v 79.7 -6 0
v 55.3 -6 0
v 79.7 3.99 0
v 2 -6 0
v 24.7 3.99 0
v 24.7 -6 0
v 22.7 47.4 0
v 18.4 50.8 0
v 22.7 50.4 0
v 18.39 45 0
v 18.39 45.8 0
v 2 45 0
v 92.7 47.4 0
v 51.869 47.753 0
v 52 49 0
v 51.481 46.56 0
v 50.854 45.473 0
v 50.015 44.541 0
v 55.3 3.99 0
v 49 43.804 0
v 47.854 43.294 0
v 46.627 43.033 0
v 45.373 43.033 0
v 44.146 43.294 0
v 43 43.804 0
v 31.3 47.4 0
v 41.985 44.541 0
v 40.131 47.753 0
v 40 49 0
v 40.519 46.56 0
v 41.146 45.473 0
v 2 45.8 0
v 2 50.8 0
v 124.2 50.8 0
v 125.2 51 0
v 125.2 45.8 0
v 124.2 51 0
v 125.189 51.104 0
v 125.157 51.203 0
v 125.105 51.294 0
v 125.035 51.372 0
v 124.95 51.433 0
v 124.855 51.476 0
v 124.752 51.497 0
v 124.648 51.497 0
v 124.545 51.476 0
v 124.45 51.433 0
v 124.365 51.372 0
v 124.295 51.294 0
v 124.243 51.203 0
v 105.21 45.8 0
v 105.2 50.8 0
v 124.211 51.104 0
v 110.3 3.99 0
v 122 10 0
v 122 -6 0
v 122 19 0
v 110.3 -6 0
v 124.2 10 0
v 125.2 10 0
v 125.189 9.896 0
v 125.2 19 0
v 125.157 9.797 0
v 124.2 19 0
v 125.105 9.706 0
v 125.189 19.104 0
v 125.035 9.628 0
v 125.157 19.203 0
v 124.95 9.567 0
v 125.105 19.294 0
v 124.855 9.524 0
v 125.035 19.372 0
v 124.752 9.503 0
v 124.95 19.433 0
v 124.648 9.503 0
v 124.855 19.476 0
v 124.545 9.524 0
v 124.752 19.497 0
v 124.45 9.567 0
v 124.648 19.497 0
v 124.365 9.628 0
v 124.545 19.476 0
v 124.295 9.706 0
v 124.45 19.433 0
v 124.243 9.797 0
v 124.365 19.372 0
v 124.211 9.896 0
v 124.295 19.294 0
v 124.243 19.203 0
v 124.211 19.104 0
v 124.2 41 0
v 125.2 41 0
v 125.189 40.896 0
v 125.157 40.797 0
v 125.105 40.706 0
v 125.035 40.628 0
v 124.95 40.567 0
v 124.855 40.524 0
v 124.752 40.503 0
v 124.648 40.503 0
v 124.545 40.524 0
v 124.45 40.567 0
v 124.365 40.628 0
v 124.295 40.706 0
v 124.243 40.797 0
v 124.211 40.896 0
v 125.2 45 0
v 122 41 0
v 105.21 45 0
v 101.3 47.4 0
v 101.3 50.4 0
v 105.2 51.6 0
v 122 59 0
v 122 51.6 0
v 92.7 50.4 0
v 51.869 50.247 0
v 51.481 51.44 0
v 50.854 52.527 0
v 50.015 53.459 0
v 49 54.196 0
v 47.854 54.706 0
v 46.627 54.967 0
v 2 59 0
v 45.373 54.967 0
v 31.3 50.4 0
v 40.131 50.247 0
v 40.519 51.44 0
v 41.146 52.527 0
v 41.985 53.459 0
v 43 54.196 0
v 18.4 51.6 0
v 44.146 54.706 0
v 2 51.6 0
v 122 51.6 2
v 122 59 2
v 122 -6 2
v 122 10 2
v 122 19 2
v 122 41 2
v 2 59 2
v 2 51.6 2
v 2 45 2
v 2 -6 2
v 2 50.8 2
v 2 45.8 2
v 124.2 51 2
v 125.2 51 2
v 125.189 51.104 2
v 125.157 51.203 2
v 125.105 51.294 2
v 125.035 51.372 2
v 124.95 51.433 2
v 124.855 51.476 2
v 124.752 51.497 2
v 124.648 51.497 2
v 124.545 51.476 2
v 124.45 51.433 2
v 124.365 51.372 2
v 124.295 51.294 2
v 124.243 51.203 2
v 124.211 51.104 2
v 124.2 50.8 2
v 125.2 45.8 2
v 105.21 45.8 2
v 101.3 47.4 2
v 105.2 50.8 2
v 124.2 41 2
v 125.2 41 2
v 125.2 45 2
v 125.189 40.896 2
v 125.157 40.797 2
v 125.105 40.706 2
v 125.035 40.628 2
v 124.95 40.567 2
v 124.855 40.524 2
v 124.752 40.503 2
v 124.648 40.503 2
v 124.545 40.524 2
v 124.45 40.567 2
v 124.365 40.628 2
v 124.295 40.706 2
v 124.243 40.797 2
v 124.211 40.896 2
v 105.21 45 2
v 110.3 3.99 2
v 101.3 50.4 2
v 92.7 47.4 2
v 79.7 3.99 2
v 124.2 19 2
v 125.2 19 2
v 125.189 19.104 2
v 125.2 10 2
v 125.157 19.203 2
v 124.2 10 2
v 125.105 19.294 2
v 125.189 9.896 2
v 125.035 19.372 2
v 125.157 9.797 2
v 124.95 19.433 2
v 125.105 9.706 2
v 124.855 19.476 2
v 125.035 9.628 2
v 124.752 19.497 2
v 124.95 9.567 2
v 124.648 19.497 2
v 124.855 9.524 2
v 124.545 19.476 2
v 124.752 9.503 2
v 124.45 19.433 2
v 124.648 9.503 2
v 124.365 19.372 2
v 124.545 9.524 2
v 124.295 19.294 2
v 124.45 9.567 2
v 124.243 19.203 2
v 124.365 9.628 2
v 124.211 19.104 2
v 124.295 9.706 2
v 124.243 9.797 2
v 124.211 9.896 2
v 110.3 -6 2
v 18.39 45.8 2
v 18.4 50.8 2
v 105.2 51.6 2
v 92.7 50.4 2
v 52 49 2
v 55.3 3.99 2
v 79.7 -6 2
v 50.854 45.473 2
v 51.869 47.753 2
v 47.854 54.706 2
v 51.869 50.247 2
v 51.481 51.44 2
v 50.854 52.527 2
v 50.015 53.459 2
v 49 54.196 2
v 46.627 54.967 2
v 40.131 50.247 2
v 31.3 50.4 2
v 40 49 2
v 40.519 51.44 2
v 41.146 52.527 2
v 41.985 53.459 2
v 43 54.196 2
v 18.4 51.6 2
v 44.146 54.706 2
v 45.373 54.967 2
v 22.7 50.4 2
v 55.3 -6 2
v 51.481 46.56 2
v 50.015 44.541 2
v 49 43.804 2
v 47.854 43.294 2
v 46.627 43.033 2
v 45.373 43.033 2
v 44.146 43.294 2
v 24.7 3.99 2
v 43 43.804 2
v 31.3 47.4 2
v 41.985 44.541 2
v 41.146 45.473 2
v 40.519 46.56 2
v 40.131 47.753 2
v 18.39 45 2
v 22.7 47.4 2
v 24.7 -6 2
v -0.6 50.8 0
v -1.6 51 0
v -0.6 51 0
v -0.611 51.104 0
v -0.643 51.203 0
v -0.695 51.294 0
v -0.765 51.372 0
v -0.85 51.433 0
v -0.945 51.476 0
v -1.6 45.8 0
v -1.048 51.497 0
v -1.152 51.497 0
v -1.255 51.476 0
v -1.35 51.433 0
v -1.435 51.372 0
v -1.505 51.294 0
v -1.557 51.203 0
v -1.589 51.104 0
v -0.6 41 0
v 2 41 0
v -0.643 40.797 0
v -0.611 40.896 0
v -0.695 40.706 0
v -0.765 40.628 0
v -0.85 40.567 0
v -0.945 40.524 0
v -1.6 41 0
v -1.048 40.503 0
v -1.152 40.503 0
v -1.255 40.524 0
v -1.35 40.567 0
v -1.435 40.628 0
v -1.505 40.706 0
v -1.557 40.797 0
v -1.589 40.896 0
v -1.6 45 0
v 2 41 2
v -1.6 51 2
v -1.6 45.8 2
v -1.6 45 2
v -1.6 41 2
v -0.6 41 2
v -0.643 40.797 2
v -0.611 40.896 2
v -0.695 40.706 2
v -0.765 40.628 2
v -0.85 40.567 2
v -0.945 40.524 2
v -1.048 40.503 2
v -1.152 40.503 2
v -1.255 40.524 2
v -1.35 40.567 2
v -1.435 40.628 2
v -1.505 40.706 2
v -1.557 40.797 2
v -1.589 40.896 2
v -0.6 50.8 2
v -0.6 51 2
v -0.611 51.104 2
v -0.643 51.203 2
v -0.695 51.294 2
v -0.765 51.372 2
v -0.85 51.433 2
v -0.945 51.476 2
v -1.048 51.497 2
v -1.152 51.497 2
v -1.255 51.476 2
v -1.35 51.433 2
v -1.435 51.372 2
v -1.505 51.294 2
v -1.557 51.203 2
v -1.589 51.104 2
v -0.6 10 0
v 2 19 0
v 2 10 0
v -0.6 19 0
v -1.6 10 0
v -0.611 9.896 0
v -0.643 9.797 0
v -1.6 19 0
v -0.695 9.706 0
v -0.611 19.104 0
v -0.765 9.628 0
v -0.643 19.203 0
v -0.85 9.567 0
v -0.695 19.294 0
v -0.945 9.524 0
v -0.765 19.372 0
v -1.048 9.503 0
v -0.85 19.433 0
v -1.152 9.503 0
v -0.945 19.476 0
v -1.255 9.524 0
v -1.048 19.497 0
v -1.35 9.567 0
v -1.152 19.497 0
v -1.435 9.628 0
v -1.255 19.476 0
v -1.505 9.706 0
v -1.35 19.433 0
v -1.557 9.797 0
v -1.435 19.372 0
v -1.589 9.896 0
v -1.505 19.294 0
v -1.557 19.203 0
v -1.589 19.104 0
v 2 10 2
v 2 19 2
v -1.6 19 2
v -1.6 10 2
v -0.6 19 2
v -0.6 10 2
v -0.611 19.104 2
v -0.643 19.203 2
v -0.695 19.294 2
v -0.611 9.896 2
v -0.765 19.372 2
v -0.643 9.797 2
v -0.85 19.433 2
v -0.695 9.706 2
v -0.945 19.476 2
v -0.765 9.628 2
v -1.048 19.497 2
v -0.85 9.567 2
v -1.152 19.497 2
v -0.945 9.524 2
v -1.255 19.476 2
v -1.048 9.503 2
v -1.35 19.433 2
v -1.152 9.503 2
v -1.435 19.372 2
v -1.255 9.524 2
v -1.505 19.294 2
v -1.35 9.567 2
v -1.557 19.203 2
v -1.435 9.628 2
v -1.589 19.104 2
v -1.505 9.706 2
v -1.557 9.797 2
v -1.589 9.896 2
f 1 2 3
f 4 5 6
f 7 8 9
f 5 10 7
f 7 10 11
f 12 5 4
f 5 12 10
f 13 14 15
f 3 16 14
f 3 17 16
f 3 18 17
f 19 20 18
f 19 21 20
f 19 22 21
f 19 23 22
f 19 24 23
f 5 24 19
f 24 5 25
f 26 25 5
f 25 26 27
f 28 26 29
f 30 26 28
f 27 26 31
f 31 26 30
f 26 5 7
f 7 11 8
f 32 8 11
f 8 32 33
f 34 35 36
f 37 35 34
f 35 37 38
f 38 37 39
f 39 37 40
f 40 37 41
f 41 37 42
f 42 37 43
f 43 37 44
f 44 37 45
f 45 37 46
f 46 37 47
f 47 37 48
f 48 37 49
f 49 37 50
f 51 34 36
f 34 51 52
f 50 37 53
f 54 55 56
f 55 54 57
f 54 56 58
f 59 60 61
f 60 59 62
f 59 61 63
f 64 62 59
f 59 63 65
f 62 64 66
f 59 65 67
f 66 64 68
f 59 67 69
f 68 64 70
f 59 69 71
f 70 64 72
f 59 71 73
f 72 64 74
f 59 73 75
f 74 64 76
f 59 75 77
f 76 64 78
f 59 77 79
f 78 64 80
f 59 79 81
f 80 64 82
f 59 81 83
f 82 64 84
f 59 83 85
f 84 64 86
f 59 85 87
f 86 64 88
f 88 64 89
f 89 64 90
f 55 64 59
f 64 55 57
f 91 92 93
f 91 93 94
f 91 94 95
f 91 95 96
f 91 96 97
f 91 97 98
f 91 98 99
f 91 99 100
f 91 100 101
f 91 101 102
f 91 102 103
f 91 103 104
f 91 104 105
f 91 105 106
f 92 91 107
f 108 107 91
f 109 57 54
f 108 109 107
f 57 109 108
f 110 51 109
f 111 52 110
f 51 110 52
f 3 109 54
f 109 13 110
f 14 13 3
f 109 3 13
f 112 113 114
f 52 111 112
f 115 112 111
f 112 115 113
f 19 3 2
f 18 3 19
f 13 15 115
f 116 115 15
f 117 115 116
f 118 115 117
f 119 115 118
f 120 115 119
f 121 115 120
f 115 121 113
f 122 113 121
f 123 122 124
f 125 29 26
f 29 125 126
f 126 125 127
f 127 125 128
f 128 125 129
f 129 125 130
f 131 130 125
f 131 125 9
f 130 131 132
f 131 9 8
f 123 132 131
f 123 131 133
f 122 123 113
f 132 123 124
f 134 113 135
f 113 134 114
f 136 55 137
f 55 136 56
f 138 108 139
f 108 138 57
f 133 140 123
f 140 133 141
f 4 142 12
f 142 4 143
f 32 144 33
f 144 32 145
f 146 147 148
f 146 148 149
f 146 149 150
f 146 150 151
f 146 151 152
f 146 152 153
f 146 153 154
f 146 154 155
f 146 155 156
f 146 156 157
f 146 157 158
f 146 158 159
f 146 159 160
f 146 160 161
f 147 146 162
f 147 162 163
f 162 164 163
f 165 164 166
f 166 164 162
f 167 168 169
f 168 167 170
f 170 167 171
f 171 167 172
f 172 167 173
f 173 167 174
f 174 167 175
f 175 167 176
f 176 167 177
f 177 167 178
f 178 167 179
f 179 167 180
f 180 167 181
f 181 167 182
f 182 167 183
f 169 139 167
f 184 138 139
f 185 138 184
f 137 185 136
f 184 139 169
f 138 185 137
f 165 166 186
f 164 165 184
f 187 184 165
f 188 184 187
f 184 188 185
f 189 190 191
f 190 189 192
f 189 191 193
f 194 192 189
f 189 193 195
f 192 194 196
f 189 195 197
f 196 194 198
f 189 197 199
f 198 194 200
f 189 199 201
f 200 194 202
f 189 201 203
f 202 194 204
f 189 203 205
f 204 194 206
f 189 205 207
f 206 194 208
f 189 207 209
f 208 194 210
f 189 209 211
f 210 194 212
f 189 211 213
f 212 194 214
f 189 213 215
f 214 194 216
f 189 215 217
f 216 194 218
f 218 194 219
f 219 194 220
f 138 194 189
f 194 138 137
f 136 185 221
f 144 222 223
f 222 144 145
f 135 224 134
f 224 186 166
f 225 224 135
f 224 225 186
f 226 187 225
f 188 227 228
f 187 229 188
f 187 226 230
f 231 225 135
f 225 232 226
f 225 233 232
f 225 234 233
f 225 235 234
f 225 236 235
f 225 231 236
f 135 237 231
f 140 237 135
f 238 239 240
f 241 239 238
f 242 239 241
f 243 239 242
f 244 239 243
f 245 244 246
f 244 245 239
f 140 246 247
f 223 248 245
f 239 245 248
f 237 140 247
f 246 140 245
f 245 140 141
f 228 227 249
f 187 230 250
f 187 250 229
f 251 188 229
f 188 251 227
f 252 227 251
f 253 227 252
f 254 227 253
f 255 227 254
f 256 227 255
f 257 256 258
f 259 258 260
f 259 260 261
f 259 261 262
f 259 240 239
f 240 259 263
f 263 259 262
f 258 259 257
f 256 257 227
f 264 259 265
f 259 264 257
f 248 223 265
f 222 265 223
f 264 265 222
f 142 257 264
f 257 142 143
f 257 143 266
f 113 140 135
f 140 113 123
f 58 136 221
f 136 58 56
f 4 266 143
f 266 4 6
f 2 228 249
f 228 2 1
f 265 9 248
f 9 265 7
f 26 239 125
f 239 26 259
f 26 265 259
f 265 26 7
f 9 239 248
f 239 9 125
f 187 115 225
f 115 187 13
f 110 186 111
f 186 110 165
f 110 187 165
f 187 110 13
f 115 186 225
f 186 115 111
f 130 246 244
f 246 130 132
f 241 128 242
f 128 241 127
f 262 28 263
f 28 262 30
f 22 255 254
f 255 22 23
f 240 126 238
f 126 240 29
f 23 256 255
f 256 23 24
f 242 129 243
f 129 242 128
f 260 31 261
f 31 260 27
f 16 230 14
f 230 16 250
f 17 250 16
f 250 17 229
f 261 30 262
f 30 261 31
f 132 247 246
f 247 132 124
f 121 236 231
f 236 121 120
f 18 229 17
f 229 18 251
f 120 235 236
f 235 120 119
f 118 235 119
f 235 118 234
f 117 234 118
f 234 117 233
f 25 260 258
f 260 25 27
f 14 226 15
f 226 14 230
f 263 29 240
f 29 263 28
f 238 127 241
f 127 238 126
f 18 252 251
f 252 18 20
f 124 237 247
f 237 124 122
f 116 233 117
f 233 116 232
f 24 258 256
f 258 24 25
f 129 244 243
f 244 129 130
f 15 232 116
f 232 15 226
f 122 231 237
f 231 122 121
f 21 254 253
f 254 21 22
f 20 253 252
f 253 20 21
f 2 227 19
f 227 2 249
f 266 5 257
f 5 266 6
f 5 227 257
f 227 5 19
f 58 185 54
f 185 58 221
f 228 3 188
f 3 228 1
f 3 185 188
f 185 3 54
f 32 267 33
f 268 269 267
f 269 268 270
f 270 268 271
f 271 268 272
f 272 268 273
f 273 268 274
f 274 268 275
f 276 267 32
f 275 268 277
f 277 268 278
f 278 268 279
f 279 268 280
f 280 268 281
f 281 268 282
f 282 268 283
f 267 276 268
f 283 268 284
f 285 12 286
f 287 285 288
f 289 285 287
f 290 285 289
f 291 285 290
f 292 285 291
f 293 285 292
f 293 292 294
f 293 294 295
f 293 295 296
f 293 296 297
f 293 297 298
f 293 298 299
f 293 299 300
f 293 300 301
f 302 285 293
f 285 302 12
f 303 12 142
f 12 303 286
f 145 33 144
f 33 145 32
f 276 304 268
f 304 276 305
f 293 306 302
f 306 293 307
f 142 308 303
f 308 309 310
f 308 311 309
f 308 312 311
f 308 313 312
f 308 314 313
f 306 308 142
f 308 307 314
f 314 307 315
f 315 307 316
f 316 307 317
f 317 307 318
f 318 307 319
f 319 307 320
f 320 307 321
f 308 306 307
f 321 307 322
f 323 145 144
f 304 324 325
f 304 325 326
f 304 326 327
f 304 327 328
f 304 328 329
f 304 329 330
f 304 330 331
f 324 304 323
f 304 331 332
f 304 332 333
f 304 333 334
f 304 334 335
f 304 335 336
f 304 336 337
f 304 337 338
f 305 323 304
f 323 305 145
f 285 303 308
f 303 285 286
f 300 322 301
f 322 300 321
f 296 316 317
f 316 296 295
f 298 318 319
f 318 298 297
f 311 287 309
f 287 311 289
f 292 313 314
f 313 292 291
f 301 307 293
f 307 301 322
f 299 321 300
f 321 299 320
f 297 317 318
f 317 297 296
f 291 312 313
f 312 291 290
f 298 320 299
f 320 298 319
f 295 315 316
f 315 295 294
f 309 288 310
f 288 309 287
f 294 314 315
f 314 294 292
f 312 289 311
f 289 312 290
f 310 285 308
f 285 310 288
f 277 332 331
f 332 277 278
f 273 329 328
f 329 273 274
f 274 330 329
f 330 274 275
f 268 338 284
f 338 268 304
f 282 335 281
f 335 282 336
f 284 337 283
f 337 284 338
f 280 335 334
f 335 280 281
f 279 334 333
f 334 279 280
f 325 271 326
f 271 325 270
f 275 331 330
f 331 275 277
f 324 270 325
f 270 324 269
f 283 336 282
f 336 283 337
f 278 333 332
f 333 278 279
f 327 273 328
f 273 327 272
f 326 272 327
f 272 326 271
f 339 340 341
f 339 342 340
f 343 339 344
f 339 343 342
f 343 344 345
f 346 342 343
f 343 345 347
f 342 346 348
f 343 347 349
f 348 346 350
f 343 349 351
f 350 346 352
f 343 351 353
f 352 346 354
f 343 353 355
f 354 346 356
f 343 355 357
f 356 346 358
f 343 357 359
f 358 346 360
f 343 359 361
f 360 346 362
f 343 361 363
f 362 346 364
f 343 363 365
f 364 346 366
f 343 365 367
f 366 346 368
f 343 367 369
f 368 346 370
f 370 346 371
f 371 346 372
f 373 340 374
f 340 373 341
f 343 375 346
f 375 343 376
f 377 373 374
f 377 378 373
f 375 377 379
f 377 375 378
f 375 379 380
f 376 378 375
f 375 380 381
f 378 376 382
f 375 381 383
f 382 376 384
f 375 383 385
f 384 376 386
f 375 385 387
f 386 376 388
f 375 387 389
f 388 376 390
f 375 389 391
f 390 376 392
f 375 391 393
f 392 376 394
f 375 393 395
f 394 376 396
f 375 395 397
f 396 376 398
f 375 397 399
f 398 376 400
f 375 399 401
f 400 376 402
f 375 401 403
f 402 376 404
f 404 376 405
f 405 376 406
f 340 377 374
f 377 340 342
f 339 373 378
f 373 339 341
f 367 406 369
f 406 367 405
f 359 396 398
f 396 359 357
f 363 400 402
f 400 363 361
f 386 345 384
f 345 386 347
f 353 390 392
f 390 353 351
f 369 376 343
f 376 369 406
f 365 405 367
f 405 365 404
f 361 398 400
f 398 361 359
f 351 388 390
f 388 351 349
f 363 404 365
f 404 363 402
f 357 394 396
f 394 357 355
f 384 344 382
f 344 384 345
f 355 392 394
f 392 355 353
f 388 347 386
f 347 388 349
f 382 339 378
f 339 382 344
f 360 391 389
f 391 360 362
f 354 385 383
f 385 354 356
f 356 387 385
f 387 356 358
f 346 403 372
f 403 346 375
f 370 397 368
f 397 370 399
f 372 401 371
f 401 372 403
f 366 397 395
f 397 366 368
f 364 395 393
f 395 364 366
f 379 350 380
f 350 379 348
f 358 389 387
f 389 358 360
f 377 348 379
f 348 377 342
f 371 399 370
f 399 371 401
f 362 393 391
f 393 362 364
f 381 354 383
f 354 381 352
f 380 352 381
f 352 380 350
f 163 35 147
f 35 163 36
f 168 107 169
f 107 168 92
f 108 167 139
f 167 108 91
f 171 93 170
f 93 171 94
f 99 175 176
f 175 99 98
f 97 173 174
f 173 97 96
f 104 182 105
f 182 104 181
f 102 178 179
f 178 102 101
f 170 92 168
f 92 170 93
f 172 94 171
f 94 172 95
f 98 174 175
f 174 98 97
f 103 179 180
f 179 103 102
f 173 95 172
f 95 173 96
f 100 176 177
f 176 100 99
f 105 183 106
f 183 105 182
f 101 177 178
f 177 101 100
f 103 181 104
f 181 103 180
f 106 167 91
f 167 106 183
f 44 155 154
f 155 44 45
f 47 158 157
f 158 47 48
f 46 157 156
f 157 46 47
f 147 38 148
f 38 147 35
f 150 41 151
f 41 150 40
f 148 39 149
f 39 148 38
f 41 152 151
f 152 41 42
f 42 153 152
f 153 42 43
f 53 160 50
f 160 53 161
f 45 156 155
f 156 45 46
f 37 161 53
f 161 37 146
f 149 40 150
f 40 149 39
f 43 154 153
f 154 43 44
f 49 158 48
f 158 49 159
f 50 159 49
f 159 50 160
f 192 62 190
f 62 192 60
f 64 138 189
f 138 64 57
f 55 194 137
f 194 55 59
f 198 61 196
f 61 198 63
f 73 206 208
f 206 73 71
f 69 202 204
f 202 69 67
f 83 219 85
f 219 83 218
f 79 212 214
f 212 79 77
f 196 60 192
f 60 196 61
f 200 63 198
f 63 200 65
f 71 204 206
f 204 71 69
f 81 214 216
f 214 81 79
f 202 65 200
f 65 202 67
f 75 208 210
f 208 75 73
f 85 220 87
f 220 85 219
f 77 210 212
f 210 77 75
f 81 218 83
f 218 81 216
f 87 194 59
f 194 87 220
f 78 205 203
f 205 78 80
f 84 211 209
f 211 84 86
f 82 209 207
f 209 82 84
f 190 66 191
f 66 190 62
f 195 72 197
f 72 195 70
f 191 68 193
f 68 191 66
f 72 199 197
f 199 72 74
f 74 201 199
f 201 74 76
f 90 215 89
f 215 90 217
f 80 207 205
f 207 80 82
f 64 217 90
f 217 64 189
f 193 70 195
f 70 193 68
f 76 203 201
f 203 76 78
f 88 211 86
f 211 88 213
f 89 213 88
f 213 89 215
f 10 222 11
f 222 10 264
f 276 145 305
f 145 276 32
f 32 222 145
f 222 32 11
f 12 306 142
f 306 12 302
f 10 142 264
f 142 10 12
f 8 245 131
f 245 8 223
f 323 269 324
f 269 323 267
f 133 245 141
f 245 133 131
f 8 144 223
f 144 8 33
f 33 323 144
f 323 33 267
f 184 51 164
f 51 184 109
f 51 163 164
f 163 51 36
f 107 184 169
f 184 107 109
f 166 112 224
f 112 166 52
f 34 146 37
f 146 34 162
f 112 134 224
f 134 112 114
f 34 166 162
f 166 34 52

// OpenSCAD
include <whole_case.scad>

rotate([0,90,0]) translate([-wall,0,0]) right_panel();
